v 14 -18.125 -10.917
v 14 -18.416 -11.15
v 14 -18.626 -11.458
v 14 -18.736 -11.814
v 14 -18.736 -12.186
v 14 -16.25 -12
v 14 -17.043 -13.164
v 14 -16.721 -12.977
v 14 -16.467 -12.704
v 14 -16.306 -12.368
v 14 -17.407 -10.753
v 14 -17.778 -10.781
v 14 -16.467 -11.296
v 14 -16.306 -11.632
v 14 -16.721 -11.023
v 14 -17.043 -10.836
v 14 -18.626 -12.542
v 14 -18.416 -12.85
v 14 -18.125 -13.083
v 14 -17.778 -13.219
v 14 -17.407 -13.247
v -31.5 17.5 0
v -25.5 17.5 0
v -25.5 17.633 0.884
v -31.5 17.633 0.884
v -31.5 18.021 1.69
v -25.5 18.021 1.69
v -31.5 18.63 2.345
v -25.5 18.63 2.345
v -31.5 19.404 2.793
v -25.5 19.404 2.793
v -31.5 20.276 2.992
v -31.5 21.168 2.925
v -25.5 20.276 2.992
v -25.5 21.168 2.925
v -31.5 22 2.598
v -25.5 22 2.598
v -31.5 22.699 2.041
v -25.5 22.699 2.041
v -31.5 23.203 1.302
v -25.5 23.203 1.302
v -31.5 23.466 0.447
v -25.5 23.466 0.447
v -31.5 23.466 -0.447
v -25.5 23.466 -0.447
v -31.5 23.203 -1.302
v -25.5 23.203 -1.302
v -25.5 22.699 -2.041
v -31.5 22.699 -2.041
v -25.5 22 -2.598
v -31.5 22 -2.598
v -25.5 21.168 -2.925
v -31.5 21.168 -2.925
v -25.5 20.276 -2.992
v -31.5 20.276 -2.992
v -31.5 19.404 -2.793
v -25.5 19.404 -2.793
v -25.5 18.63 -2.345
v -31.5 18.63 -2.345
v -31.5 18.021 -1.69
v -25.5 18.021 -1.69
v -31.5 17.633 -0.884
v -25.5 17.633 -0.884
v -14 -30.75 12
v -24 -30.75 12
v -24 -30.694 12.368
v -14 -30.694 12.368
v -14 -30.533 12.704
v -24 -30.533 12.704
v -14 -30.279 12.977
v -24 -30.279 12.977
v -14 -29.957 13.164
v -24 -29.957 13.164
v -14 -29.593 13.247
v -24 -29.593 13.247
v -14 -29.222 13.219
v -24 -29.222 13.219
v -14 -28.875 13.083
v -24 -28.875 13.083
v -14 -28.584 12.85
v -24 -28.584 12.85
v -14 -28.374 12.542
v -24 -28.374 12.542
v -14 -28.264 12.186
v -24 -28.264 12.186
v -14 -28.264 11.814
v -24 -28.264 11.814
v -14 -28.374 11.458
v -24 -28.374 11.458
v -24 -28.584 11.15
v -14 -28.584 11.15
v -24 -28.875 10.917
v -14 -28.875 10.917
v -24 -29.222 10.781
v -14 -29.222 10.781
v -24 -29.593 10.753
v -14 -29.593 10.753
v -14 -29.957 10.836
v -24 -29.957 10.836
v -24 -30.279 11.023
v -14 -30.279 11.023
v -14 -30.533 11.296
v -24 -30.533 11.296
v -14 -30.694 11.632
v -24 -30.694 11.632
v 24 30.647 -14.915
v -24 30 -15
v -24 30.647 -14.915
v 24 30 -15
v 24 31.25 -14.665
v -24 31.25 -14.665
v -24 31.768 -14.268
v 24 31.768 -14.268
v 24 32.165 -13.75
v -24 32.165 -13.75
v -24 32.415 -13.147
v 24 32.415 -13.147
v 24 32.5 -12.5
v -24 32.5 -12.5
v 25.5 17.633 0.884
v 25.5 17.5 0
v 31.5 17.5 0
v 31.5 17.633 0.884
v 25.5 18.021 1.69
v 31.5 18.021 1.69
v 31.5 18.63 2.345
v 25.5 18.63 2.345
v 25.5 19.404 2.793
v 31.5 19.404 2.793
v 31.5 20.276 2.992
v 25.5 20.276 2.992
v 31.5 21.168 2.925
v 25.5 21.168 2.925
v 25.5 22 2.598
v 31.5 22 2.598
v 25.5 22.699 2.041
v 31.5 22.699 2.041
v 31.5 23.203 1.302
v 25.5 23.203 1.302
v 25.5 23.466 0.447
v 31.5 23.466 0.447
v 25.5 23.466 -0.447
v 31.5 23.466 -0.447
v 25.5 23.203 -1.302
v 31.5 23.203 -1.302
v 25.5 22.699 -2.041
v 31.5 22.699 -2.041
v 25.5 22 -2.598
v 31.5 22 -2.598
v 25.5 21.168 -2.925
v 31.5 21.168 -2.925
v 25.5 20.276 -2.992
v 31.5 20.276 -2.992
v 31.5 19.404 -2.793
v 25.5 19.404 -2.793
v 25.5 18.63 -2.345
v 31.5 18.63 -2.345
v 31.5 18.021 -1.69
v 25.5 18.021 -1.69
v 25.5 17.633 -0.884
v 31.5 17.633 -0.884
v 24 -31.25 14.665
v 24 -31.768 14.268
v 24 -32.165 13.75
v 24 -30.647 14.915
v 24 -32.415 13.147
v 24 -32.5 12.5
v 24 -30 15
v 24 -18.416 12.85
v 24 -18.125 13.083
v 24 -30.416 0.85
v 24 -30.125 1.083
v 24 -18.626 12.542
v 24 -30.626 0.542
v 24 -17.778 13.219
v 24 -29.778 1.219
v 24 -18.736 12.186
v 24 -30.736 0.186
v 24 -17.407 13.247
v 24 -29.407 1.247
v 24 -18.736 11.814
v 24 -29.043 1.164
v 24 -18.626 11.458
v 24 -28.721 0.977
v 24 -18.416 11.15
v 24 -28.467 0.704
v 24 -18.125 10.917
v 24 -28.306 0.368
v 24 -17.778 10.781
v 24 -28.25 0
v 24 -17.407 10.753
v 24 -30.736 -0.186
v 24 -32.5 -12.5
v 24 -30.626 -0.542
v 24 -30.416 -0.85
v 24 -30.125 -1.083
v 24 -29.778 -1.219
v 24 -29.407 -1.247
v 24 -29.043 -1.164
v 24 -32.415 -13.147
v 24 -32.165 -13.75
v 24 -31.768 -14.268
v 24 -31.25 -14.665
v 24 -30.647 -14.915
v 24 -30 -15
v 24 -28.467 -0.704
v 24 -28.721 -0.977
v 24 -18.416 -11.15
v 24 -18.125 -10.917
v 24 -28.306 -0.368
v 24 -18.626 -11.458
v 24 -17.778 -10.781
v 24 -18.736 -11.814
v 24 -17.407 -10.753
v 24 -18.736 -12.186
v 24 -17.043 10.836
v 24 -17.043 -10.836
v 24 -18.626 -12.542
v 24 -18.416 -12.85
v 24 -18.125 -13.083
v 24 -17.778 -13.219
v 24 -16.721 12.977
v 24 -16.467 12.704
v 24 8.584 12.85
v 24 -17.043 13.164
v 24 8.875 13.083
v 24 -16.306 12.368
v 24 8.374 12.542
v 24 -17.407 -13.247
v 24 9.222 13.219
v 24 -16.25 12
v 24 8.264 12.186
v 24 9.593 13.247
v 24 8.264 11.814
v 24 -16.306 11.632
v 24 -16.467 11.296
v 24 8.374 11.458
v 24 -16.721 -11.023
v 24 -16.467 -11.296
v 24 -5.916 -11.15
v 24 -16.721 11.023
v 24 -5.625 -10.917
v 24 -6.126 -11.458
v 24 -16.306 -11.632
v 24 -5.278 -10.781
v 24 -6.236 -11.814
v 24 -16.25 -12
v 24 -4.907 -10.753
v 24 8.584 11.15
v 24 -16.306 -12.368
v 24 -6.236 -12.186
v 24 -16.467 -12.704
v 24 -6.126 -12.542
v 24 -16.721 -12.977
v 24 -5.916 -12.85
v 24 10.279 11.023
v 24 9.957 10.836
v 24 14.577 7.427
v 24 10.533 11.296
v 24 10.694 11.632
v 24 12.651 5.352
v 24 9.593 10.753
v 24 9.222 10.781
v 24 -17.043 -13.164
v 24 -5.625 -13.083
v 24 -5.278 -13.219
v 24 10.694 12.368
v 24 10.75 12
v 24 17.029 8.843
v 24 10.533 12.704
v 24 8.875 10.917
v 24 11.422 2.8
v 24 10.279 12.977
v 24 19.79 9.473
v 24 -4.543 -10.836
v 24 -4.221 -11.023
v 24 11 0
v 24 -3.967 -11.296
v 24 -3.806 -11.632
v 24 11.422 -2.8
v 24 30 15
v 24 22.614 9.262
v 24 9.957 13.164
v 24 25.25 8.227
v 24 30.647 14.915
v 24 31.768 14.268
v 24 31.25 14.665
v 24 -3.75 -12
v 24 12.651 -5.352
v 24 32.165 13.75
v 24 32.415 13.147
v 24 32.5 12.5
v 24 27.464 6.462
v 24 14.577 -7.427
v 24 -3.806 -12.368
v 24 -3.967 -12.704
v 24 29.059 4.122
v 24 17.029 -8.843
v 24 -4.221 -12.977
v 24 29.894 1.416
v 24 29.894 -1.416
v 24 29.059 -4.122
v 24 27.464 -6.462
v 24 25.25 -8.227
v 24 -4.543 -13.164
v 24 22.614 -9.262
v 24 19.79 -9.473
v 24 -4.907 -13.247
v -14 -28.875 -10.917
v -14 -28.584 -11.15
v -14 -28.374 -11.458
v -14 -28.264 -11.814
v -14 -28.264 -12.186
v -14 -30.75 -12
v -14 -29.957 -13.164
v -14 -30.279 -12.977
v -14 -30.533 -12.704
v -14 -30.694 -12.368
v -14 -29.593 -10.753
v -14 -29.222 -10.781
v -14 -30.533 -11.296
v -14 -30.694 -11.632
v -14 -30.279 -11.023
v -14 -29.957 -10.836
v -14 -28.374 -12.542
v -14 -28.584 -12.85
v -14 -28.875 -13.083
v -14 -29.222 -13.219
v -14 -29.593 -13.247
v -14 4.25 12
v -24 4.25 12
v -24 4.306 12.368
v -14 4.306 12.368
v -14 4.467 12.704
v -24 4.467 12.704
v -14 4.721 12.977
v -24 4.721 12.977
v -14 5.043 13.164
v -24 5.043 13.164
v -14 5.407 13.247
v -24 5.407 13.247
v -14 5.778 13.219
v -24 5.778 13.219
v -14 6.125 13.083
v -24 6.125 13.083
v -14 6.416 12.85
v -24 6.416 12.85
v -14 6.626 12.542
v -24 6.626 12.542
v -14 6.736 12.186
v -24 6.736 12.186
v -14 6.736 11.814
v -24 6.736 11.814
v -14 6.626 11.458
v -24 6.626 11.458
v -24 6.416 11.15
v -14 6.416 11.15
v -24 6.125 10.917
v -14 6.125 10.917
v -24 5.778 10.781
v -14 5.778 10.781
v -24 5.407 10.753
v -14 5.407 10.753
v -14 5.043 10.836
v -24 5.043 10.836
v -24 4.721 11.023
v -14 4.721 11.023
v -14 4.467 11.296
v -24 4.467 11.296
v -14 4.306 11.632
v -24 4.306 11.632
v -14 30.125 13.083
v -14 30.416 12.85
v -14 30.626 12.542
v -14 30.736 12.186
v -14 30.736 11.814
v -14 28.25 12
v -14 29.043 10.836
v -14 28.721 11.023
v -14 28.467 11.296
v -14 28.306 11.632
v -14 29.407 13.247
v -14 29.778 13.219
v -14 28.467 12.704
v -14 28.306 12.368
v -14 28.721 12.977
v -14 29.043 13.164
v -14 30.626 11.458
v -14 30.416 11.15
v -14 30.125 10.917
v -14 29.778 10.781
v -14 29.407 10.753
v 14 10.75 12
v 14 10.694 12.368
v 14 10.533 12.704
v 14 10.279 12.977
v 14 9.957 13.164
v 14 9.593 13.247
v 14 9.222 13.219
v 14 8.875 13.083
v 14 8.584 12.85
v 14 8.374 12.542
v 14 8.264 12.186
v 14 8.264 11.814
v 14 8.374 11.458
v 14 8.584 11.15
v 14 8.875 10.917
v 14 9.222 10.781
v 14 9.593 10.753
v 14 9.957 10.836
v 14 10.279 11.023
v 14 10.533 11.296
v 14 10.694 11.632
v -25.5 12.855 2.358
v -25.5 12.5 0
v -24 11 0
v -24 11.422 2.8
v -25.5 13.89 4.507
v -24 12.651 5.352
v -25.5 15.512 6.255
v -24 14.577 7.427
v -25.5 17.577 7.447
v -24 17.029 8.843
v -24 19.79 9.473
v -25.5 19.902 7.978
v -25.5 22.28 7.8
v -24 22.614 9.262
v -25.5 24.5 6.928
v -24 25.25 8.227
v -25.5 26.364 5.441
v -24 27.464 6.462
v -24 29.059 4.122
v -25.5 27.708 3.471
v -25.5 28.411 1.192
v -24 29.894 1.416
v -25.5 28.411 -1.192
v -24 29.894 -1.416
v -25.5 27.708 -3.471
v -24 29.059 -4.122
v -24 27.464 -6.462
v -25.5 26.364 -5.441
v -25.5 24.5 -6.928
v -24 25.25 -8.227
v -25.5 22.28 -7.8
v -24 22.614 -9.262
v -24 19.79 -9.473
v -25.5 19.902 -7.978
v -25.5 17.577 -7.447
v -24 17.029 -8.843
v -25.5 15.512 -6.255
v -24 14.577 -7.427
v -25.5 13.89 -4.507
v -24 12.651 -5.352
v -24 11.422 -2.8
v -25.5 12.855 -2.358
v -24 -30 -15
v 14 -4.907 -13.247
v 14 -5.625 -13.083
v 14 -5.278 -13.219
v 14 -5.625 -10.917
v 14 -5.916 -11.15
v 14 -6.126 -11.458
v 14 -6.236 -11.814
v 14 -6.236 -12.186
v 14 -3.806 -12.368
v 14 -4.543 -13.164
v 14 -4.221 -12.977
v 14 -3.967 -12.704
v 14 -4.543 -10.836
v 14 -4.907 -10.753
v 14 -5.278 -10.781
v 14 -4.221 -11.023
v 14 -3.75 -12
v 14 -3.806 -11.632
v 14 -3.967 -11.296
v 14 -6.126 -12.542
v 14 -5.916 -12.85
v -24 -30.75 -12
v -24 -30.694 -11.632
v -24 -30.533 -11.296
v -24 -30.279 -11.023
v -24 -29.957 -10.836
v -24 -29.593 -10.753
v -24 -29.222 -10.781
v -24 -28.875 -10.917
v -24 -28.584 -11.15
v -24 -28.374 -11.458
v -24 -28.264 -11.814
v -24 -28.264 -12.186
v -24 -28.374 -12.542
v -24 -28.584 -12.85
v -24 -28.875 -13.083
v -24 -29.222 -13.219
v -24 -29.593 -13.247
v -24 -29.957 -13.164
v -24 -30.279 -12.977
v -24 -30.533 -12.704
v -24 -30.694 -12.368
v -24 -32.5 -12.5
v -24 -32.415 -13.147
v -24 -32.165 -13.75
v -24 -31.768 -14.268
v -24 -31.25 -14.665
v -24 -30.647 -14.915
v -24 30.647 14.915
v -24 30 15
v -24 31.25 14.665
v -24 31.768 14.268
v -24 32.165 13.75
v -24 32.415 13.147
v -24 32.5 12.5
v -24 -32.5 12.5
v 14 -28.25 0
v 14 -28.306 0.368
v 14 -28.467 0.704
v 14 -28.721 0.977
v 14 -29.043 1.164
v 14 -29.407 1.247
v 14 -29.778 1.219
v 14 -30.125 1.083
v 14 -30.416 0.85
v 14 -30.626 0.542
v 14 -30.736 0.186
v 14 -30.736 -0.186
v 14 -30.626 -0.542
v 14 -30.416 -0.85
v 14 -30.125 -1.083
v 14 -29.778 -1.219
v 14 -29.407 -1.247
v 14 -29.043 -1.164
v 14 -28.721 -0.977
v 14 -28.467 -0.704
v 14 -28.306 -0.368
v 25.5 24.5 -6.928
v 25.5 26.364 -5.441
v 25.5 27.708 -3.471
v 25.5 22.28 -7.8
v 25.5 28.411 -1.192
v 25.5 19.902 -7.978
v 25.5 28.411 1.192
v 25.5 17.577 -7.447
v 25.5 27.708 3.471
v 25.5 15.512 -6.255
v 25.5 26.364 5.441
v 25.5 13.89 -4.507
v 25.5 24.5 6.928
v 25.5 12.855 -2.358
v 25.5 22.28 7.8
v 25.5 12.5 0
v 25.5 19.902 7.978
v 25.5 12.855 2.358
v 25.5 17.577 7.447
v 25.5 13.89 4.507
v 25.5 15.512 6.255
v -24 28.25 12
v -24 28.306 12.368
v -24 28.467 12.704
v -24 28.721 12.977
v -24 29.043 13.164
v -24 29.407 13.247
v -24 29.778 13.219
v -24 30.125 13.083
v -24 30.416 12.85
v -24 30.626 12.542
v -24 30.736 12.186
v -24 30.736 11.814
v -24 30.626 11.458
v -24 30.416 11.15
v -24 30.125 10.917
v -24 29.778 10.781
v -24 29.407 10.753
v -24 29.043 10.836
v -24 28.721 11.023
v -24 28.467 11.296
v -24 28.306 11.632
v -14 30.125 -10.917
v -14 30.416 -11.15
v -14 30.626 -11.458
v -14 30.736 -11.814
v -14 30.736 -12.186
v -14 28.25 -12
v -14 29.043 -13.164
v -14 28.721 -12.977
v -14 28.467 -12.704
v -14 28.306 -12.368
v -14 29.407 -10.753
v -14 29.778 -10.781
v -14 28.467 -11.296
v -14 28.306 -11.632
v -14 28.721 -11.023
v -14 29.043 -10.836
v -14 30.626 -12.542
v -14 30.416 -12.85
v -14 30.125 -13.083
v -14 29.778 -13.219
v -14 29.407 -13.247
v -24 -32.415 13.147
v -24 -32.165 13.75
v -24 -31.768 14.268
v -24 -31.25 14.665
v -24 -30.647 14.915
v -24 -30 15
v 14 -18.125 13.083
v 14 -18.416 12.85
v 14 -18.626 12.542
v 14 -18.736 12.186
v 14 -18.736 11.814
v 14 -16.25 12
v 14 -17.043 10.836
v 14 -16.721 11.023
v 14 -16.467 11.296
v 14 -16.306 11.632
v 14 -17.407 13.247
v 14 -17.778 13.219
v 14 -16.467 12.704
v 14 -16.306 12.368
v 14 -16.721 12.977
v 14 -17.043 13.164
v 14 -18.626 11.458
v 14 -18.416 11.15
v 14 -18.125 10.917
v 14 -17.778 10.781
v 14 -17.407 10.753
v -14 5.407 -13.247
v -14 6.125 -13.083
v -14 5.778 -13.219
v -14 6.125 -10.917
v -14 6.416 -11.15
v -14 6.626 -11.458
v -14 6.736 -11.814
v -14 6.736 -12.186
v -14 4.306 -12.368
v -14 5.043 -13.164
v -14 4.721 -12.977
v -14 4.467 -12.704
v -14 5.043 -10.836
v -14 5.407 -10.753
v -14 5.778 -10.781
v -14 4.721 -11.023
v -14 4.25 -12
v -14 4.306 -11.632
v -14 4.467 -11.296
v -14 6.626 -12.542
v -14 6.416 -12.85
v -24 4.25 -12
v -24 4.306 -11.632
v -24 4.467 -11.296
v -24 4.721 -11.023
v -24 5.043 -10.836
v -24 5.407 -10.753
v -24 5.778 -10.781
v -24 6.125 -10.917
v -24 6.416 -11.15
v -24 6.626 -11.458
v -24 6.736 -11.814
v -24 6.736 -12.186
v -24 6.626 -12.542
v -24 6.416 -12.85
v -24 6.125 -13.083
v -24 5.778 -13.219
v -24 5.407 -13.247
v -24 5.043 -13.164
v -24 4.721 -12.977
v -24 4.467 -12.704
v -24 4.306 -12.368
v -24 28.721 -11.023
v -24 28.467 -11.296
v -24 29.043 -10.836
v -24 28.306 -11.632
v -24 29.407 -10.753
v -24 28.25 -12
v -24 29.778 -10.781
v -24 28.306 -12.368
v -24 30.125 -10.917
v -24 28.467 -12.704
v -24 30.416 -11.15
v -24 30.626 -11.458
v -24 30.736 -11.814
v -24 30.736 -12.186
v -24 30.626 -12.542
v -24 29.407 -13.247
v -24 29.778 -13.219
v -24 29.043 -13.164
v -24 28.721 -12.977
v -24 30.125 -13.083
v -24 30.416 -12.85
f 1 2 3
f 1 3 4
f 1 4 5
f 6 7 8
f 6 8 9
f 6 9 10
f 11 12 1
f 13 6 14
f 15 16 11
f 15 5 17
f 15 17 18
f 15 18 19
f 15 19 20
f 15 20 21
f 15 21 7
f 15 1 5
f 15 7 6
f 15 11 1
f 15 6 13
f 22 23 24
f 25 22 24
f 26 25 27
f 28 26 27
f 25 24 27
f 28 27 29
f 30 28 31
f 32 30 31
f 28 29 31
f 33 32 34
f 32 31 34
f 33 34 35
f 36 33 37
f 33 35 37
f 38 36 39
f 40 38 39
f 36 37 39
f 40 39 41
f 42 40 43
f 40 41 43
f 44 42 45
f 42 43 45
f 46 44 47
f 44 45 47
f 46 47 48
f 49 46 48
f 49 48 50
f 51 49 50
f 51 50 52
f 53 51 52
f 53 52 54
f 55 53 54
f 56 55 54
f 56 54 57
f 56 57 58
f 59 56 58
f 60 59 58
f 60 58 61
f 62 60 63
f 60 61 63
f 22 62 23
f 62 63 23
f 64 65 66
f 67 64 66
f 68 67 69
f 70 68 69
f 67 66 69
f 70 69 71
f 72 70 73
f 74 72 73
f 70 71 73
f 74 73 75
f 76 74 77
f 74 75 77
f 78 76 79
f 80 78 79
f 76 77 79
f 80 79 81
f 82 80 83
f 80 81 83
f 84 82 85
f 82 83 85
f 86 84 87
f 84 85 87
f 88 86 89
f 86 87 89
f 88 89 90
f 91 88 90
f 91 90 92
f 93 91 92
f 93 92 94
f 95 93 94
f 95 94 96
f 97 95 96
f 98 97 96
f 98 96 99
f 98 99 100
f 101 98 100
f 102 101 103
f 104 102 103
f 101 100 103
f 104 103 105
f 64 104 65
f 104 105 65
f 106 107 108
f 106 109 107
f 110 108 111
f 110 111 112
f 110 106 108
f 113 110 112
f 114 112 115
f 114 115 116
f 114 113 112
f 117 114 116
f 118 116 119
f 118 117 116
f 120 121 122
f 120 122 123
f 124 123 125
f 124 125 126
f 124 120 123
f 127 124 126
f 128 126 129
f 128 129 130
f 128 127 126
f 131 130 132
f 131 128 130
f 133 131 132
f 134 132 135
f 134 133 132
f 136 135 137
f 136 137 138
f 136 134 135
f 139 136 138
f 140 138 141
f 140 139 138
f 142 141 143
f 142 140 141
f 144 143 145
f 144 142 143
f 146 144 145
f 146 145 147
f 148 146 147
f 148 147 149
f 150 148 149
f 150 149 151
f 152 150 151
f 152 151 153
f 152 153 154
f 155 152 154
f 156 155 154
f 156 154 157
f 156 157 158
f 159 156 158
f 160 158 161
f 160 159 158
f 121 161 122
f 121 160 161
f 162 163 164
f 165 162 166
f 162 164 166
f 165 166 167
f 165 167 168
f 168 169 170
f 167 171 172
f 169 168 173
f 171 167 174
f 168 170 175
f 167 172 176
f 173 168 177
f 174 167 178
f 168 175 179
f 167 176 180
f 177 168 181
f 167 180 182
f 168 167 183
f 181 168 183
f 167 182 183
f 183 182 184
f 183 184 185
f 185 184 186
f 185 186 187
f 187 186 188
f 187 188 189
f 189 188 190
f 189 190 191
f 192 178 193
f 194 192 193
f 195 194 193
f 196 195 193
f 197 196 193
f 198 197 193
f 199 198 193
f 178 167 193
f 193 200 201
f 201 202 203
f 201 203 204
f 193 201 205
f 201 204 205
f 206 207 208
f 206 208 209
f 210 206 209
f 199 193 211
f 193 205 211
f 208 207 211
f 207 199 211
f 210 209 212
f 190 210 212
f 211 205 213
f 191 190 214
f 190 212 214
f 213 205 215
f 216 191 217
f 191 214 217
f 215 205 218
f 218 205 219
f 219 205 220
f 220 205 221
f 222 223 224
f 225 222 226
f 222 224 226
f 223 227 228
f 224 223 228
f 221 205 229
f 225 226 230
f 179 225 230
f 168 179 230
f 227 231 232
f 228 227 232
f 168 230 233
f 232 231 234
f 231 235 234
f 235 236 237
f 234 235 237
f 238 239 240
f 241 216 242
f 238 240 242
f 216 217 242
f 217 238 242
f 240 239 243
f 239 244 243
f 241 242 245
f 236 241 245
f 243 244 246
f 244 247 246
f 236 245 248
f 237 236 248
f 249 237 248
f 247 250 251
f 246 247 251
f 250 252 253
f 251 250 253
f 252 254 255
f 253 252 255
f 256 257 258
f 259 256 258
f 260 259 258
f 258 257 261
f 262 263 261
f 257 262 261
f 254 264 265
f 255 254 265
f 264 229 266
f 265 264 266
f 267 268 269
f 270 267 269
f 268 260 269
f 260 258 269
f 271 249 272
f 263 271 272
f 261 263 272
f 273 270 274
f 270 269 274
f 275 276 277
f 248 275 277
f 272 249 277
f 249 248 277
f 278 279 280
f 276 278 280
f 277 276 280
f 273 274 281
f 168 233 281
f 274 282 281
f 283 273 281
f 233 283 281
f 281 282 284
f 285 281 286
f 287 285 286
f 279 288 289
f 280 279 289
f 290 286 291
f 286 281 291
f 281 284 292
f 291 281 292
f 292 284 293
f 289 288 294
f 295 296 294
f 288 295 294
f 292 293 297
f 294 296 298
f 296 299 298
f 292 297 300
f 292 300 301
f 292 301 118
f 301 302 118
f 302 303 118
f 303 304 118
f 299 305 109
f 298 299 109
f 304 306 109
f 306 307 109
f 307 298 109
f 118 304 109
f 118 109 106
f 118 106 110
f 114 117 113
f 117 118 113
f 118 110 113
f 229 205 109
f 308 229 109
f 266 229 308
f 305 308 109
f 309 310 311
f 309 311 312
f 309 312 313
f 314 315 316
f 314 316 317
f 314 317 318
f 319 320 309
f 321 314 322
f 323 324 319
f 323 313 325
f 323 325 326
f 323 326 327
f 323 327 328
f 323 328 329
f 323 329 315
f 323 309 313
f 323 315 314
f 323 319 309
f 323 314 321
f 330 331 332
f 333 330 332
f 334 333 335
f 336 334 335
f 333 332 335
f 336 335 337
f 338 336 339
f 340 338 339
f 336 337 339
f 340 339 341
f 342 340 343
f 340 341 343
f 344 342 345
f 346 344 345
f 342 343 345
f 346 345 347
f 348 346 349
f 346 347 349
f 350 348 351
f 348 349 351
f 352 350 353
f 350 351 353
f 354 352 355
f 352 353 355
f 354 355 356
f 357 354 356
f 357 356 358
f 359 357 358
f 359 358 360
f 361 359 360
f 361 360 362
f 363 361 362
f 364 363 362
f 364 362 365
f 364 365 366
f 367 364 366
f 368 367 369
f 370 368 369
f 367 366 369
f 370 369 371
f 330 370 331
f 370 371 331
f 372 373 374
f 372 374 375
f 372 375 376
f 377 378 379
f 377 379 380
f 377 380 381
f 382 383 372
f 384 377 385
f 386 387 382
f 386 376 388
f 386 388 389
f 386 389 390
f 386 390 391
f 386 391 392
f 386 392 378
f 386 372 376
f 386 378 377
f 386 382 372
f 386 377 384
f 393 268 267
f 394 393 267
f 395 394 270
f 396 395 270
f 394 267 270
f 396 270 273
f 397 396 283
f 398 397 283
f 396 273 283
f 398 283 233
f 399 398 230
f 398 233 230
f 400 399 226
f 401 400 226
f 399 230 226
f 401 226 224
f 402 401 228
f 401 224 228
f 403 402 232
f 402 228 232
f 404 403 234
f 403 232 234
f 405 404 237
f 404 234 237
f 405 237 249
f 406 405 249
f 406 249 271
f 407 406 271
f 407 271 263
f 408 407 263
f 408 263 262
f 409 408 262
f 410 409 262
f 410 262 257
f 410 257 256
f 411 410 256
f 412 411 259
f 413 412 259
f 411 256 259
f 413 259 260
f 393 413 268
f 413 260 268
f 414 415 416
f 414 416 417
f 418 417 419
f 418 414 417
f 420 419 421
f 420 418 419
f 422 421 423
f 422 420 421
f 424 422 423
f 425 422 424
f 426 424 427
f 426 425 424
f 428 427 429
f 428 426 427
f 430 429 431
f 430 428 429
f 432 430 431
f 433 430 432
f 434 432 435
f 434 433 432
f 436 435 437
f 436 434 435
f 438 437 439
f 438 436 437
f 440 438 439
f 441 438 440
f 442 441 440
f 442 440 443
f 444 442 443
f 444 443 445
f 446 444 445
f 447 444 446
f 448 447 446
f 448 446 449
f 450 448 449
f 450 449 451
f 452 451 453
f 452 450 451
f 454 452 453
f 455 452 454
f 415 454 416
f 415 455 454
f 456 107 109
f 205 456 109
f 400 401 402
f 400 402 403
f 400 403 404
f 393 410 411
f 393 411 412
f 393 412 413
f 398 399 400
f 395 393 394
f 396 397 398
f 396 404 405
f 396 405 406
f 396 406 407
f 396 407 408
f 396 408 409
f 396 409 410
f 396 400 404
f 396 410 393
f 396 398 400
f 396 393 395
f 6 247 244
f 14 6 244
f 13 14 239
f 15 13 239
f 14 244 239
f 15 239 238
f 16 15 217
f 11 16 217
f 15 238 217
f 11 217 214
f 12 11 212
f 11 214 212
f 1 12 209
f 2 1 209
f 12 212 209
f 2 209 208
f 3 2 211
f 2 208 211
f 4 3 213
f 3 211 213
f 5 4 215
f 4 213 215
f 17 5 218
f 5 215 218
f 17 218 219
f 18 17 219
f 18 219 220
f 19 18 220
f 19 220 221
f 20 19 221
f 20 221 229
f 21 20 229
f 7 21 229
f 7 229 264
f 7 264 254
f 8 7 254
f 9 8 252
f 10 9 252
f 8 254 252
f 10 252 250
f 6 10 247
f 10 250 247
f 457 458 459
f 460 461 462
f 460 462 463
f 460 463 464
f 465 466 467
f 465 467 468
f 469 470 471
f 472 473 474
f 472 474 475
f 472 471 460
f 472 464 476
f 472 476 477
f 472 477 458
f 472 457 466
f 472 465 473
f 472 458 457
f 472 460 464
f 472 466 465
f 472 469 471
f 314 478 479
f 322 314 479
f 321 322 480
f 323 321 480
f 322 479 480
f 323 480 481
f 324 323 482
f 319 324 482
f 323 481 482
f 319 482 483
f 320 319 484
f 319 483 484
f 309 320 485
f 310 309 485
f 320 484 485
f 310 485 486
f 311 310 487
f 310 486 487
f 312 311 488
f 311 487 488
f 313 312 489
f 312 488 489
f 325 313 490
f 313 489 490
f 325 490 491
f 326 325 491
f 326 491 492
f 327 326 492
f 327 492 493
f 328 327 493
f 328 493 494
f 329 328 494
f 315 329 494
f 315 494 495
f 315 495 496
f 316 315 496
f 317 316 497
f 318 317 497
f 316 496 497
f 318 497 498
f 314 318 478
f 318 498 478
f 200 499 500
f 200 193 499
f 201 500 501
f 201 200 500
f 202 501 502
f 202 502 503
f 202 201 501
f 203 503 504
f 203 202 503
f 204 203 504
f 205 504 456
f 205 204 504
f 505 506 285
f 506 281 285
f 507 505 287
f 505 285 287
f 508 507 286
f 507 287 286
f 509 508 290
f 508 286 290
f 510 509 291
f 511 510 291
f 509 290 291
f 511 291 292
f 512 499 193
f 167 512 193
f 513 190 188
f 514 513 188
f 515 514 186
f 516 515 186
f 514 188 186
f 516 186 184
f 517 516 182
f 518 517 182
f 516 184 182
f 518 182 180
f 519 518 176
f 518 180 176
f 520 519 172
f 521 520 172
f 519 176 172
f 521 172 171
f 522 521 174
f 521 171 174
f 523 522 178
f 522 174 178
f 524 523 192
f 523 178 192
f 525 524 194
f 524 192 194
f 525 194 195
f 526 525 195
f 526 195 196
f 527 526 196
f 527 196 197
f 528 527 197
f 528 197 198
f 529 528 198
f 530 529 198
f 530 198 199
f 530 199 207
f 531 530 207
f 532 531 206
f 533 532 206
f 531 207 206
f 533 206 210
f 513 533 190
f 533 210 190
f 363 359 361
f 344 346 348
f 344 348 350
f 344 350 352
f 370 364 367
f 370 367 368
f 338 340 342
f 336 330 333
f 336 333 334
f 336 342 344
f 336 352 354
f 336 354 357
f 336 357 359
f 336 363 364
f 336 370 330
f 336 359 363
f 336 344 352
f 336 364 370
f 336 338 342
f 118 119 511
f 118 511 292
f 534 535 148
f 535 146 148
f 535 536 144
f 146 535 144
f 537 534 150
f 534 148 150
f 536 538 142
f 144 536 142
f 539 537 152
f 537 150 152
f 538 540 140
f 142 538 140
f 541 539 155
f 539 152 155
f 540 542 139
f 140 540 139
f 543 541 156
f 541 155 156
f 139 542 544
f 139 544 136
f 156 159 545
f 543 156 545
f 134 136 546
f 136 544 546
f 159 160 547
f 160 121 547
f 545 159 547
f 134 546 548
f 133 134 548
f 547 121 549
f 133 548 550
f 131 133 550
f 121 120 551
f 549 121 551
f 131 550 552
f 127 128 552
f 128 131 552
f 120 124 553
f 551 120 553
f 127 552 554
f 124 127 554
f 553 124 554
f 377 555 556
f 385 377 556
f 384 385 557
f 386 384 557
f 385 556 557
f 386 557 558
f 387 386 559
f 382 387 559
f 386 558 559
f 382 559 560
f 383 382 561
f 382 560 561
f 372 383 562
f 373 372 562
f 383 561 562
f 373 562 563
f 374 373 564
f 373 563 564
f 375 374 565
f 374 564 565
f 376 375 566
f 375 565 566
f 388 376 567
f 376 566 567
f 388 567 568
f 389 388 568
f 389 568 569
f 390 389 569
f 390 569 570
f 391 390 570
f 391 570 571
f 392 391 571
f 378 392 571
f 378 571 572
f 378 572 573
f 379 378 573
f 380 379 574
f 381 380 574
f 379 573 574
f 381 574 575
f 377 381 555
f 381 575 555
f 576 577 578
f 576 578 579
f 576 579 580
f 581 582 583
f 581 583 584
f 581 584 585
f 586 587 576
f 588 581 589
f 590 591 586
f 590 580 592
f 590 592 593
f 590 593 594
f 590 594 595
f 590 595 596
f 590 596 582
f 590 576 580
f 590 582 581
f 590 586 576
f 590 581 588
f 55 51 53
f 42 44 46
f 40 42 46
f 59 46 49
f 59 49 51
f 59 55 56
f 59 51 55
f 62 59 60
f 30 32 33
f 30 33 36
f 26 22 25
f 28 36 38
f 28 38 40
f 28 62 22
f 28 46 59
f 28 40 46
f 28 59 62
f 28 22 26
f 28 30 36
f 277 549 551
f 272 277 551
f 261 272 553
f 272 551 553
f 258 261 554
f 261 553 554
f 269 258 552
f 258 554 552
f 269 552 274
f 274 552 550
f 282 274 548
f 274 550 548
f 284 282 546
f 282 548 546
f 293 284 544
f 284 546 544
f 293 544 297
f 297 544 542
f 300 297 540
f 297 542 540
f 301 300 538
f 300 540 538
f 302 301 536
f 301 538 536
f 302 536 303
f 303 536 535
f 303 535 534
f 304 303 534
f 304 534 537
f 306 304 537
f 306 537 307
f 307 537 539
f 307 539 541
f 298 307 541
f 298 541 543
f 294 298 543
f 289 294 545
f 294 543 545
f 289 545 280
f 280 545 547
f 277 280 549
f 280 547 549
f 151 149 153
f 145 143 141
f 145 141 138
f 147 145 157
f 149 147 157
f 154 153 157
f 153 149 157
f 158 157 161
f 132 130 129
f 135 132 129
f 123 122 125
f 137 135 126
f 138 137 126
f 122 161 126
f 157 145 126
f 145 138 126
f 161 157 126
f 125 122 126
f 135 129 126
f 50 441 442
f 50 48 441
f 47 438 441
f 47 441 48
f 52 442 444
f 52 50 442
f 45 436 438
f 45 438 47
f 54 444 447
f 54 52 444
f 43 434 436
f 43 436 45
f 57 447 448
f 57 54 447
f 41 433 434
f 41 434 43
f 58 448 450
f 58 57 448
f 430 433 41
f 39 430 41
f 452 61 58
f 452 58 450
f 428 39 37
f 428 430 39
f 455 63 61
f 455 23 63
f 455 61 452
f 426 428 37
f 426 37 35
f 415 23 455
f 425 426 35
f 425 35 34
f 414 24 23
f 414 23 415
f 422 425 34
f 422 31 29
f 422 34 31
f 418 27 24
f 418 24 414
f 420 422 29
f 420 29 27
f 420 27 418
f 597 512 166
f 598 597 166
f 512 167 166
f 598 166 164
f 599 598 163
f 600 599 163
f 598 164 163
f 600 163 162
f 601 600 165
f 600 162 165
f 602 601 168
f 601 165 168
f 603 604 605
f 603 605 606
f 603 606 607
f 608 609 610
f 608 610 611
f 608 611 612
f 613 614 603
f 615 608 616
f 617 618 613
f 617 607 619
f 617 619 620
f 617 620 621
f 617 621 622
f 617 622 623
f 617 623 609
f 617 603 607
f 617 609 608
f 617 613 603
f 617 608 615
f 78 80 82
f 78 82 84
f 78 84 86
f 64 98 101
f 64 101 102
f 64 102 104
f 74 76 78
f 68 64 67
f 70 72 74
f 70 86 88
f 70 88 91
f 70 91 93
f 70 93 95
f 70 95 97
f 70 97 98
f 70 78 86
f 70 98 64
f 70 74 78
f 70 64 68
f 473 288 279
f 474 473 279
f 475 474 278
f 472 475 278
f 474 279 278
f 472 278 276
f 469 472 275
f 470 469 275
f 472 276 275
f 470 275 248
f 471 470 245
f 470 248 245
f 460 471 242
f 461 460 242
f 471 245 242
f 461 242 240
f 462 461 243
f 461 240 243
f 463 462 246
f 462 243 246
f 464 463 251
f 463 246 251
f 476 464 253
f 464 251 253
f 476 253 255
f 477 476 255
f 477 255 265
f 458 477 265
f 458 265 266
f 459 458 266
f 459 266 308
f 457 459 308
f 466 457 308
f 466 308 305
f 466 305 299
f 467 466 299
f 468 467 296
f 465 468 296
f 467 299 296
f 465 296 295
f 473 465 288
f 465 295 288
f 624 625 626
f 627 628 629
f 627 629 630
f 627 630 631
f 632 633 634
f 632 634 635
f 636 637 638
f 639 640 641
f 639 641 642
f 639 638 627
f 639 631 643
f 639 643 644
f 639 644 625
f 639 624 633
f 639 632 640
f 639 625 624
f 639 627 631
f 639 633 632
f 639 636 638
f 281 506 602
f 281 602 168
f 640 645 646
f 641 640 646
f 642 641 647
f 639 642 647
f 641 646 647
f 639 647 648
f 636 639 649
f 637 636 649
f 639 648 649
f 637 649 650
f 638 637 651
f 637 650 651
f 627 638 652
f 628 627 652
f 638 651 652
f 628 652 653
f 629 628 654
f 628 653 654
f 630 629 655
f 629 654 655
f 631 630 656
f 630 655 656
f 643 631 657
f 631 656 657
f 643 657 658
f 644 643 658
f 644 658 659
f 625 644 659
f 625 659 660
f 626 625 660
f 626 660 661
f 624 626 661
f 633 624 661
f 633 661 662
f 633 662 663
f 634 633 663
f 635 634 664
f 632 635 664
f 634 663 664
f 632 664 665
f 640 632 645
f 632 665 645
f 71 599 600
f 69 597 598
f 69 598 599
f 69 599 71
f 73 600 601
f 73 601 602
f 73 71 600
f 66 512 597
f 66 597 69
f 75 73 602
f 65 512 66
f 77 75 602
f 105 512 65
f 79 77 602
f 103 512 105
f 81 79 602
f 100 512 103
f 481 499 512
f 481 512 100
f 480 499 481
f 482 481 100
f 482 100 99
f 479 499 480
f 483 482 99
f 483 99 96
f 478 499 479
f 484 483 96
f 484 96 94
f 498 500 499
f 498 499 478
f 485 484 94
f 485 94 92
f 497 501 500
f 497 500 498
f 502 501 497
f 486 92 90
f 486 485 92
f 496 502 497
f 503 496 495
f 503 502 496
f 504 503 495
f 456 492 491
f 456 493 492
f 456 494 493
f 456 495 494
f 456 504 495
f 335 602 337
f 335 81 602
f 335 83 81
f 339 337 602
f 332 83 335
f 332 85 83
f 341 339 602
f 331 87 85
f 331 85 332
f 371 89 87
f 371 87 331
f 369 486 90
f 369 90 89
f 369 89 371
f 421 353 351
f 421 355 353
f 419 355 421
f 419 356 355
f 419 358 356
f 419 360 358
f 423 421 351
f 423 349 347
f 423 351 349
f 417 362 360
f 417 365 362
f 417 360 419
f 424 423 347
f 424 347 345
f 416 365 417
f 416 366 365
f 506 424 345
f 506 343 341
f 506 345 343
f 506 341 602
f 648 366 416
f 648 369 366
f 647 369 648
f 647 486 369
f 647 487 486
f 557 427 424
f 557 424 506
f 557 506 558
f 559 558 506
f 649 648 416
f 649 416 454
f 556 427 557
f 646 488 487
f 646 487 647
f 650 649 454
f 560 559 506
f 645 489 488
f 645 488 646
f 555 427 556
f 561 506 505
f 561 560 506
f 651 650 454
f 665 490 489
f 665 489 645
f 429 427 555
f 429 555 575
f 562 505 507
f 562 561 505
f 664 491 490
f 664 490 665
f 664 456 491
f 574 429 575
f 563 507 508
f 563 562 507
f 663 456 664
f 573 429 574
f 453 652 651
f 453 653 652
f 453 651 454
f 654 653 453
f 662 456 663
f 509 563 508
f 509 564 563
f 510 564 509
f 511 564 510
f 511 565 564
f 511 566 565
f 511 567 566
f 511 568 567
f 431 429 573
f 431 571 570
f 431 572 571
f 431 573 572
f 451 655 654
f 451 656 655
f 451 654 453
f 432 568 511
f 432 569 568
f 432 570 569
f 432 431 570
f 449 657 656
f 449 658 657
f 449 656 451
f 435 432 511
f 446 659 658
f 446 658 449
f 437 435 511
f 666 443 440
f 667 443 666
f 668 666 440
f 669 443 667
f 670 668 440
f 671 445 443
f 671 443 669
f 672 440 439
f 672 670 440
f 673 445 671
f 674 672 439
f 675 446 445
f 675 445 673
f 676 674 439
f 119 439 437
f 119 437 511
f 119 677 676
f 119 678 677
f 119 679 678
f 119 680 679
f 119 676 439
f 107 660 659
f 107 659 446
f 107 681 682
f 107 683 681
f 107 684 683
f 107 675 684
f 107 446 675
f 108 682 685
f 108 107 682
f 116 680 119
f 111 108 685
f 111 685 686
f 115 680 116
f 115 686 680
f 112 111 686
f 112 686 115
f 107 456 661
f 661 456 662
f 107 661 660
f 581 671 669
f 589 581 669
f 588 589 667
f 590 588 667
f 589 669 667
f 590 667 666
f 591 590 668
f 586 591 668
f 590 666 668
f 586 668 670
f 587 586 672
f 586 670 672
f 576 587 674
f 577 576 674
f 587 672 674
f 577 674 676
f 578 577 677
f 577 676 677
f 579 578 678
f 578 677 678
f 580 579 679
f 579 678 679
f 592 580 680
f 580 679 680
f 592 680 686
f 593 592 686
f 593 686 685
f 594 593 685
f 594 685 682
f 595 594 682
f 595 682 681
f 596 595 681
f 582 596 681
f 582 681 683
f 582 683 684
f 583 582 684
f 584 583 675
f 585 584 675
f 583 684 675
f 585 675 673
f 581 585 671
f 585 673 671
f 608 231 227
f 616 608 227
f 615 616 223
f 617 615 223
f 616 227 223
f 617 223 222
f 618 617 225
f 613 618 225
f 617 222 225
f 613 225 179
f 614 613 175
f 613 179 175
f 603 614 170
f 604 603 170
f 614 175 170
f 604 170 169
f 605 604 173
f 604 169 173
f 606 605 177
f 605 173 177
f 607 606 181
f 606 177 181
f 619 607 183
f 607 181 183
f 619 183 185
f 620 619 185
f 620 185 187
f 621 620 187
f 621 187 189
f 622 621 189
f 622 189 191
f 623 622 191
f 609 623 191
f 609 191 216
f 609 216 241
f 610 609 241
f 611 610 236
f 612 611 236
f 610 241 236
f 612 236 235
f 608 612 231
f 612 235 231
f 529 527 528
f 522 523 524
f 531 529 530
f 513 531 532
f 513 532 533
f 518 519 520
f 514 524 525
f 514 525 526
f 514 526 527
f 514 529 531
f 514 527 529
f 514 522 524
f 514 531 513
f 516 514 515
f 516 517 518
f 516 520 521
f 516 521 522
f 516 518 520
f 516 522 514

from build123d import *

# Parameters (mm, degrees)
BOSS_EXTRUDE1_DEPTH      = 15
BOSS_EXTRUDE1_DEPTH_BACK = 15
SKETCH1_W                = 48
SKETCH1_H                = 65
SKETCH2_R                = 1.25
CUT_EXTRUDE1_DEPTH       = 10
SKETCH4_R                = 9.5
SKETCH4_R_2              = 8
SKETCH4_R_3              = 3
BOSS_EXTRUDE3_DEPTH      = 1.5
CHAMFER2_SIZE            = 1.5
SKETCH5_R                = 3
BOSS_EXTRUDE4_DEPTH      = 6
CHAMFER2_OF_MIRROR1_SIZE = 1.5
SKETCH6_R                = 1.25
SKETCH6_R_2              = 1.249999994
CUT_EXTRUDE2_DEPTH       = 10
FILLET1_R                = 2.5


with BuildPart() as part:
    # Sketch1 → Boss-Extrude1 (new, two sides: drawn at the far end of the back side and taken through both)
    with BuildSketch(Plane.XY.offset(-BOSS_EXTRUDE1_DEPTH_BACK)):
        Rectangle(SKETCH1_W, SKETCH1_H)
    extrude(amount=BOSS_EXTRUDE1_DEPTH + BOSS_EXTRUDE1_DEPTH_BACK)

    # Sketch2 → Cut-Extrude1 (cut)
    with BuildSketch(Plane.ZY.offset(24)):
        with Locations(Location((-12, 29.5, 0), (0, 0, 270))):
            Circle(SKETCH2_R)
        with Locations(Location((12, 29.5, 0), (0, 0, 270))):
            Circle(SKETCH2_R)
        with Locations(Location((12, 5.5, 0), (0, 0, 270))):
            Circle(SKETCH2_R)
        with Locations(Location((-12, 5.5, 0), (0, 0, 270))):
            Circle(SKETCH2_R)
        with Locations(Location((-12, -29.5, 0), (0, 0, 270))):
            Circle(SKETCH2_R)
        with Locations(Location((12, -29.5, 0), (0, 0, 270))):
            Circle(SKETCH2_R)
    extrude(amount=-CUT_EXTRUDE1_DEPTH, mode=Mode.SUBTRACT)

    # Sketch4 → Boss-Extrude3 (add)
    # profile 1 of 3: a face of its own
    with BuildSketch(Plane.ZY.offset(24)):
        with Locations(Location((0, 20.5, 0), (0, 0, 270))):
            Circle(SKETCH4_R)
        with Locations((0, 20.5)):
            Circle(SKETCH4_R_2, mode=Mode.SUBTRACT)
    # profile 2 of 3: a face of its own
    with BuildSketch(Plane.ZY.offset(24)):
        with Locations((0, 20.5)):
            Circle(SKETCH4_R_2)
        with Locations((0, 20.5)):
            Circle(SKETCH4_R_3, mode=Mode.SUBTRACT)
    # profile 3 of 3: a face of its own
    with BuildSketch(Plane.ZY.offset(24)):
        with Locations((0, 20.5)):
            Circle(SKETCH4_R_3)
    boss_extrude3 = extrude(amount=BOSS_EXTRUDE3_DEPTH)

    # Chamfer2
    chamfer2_edges = [part.edges().sort_by_distance(p)[0] for p in [
        (-25.5, 30, 0),
    ]]
    chamfer(chamfer2_edges, length=CHAMFER2_SIZE - 0.0001)  # a hair under: the kernel refuses the full size

    # Sketch5 → Boss-Extrude4 (add)
    with BuildSketch(Plane.ZY.offset(25.5)):
        with Locations(Location((0, 20.5, 0), (0, 0, 270))):
            Circle(SKETCH5_R)
    boss_extrude4 = extrude(amount=BOSS_EXTRUDE4_DEPTH)

    # Mirror1: Boss-Extrude3, Boss-Extrude4 across plane
    add(boss_extrude3.mirror(Plane(origin=(0, 0, 0), x_dir=(0, 0, 1), z_dir=(1, 0, 0))))
    add(boss_extrude4.mirror(Plane(origin=(0, 0, 0), x_dir=(0, 0, 1), z_dir=(1, 0, 0))))

    # Chamfer2 of Mirror1
    chamfer2_of_mirror1_edges = [part.edges().sort_by_distance(p)[0] for p in [
        (25.5, 30, 0),
    ]]
    chamfer(chamfer2_of_mirror1_edges, length=CHAMFER2_OF_MIRROR1_SIZE - 0.0001)  # a hair under: the kernel refuses the full size

    # Sketch6 → Cut-Extrude2 (cut)
    with BuildSketch(Plane(origin=(24, 0, 0), x_dir=(0, 0, -1), z_dir=(1, 0, 0))):
        with Locations(Location((11.99999998, -5, 0), (0, 0, 90))):
            Circle(SKETCH6_R)
        with Locations(Location((12.00000002, -17.5, 0), (0, 0, 90))):
            Circle(SKETCH6_R)
        with Locations(Location((0, -29.5, 0), (0, 0, 90))):
            Circle(SKETCH6_R_2)
        with Locations(Location((-12.00000002, -17.5, 0), (0, 0, 90))):
            Circle(SKETCH6_R)
        with Locations(Location((-12.00000002, 9.5, 0), (0, 0, 90))):
            Circle(SKETCH6_R)
    extrude(amount=-CUT_EXTRUDE2_DEPTH, mode=Mode.SUBTRACT)

    # Fillet1
    fillet1_edges = [part.edges().sort_by_distance(p)[0] for p in [
        (0, -32.5, 15),
        (0, 32.5, 15),
        (0, 32.5, -15),
        (0, -32.5, -15),
    ]]
    fillet(fillet1_edges, radius=FILLET1_R)


solid = part.part
